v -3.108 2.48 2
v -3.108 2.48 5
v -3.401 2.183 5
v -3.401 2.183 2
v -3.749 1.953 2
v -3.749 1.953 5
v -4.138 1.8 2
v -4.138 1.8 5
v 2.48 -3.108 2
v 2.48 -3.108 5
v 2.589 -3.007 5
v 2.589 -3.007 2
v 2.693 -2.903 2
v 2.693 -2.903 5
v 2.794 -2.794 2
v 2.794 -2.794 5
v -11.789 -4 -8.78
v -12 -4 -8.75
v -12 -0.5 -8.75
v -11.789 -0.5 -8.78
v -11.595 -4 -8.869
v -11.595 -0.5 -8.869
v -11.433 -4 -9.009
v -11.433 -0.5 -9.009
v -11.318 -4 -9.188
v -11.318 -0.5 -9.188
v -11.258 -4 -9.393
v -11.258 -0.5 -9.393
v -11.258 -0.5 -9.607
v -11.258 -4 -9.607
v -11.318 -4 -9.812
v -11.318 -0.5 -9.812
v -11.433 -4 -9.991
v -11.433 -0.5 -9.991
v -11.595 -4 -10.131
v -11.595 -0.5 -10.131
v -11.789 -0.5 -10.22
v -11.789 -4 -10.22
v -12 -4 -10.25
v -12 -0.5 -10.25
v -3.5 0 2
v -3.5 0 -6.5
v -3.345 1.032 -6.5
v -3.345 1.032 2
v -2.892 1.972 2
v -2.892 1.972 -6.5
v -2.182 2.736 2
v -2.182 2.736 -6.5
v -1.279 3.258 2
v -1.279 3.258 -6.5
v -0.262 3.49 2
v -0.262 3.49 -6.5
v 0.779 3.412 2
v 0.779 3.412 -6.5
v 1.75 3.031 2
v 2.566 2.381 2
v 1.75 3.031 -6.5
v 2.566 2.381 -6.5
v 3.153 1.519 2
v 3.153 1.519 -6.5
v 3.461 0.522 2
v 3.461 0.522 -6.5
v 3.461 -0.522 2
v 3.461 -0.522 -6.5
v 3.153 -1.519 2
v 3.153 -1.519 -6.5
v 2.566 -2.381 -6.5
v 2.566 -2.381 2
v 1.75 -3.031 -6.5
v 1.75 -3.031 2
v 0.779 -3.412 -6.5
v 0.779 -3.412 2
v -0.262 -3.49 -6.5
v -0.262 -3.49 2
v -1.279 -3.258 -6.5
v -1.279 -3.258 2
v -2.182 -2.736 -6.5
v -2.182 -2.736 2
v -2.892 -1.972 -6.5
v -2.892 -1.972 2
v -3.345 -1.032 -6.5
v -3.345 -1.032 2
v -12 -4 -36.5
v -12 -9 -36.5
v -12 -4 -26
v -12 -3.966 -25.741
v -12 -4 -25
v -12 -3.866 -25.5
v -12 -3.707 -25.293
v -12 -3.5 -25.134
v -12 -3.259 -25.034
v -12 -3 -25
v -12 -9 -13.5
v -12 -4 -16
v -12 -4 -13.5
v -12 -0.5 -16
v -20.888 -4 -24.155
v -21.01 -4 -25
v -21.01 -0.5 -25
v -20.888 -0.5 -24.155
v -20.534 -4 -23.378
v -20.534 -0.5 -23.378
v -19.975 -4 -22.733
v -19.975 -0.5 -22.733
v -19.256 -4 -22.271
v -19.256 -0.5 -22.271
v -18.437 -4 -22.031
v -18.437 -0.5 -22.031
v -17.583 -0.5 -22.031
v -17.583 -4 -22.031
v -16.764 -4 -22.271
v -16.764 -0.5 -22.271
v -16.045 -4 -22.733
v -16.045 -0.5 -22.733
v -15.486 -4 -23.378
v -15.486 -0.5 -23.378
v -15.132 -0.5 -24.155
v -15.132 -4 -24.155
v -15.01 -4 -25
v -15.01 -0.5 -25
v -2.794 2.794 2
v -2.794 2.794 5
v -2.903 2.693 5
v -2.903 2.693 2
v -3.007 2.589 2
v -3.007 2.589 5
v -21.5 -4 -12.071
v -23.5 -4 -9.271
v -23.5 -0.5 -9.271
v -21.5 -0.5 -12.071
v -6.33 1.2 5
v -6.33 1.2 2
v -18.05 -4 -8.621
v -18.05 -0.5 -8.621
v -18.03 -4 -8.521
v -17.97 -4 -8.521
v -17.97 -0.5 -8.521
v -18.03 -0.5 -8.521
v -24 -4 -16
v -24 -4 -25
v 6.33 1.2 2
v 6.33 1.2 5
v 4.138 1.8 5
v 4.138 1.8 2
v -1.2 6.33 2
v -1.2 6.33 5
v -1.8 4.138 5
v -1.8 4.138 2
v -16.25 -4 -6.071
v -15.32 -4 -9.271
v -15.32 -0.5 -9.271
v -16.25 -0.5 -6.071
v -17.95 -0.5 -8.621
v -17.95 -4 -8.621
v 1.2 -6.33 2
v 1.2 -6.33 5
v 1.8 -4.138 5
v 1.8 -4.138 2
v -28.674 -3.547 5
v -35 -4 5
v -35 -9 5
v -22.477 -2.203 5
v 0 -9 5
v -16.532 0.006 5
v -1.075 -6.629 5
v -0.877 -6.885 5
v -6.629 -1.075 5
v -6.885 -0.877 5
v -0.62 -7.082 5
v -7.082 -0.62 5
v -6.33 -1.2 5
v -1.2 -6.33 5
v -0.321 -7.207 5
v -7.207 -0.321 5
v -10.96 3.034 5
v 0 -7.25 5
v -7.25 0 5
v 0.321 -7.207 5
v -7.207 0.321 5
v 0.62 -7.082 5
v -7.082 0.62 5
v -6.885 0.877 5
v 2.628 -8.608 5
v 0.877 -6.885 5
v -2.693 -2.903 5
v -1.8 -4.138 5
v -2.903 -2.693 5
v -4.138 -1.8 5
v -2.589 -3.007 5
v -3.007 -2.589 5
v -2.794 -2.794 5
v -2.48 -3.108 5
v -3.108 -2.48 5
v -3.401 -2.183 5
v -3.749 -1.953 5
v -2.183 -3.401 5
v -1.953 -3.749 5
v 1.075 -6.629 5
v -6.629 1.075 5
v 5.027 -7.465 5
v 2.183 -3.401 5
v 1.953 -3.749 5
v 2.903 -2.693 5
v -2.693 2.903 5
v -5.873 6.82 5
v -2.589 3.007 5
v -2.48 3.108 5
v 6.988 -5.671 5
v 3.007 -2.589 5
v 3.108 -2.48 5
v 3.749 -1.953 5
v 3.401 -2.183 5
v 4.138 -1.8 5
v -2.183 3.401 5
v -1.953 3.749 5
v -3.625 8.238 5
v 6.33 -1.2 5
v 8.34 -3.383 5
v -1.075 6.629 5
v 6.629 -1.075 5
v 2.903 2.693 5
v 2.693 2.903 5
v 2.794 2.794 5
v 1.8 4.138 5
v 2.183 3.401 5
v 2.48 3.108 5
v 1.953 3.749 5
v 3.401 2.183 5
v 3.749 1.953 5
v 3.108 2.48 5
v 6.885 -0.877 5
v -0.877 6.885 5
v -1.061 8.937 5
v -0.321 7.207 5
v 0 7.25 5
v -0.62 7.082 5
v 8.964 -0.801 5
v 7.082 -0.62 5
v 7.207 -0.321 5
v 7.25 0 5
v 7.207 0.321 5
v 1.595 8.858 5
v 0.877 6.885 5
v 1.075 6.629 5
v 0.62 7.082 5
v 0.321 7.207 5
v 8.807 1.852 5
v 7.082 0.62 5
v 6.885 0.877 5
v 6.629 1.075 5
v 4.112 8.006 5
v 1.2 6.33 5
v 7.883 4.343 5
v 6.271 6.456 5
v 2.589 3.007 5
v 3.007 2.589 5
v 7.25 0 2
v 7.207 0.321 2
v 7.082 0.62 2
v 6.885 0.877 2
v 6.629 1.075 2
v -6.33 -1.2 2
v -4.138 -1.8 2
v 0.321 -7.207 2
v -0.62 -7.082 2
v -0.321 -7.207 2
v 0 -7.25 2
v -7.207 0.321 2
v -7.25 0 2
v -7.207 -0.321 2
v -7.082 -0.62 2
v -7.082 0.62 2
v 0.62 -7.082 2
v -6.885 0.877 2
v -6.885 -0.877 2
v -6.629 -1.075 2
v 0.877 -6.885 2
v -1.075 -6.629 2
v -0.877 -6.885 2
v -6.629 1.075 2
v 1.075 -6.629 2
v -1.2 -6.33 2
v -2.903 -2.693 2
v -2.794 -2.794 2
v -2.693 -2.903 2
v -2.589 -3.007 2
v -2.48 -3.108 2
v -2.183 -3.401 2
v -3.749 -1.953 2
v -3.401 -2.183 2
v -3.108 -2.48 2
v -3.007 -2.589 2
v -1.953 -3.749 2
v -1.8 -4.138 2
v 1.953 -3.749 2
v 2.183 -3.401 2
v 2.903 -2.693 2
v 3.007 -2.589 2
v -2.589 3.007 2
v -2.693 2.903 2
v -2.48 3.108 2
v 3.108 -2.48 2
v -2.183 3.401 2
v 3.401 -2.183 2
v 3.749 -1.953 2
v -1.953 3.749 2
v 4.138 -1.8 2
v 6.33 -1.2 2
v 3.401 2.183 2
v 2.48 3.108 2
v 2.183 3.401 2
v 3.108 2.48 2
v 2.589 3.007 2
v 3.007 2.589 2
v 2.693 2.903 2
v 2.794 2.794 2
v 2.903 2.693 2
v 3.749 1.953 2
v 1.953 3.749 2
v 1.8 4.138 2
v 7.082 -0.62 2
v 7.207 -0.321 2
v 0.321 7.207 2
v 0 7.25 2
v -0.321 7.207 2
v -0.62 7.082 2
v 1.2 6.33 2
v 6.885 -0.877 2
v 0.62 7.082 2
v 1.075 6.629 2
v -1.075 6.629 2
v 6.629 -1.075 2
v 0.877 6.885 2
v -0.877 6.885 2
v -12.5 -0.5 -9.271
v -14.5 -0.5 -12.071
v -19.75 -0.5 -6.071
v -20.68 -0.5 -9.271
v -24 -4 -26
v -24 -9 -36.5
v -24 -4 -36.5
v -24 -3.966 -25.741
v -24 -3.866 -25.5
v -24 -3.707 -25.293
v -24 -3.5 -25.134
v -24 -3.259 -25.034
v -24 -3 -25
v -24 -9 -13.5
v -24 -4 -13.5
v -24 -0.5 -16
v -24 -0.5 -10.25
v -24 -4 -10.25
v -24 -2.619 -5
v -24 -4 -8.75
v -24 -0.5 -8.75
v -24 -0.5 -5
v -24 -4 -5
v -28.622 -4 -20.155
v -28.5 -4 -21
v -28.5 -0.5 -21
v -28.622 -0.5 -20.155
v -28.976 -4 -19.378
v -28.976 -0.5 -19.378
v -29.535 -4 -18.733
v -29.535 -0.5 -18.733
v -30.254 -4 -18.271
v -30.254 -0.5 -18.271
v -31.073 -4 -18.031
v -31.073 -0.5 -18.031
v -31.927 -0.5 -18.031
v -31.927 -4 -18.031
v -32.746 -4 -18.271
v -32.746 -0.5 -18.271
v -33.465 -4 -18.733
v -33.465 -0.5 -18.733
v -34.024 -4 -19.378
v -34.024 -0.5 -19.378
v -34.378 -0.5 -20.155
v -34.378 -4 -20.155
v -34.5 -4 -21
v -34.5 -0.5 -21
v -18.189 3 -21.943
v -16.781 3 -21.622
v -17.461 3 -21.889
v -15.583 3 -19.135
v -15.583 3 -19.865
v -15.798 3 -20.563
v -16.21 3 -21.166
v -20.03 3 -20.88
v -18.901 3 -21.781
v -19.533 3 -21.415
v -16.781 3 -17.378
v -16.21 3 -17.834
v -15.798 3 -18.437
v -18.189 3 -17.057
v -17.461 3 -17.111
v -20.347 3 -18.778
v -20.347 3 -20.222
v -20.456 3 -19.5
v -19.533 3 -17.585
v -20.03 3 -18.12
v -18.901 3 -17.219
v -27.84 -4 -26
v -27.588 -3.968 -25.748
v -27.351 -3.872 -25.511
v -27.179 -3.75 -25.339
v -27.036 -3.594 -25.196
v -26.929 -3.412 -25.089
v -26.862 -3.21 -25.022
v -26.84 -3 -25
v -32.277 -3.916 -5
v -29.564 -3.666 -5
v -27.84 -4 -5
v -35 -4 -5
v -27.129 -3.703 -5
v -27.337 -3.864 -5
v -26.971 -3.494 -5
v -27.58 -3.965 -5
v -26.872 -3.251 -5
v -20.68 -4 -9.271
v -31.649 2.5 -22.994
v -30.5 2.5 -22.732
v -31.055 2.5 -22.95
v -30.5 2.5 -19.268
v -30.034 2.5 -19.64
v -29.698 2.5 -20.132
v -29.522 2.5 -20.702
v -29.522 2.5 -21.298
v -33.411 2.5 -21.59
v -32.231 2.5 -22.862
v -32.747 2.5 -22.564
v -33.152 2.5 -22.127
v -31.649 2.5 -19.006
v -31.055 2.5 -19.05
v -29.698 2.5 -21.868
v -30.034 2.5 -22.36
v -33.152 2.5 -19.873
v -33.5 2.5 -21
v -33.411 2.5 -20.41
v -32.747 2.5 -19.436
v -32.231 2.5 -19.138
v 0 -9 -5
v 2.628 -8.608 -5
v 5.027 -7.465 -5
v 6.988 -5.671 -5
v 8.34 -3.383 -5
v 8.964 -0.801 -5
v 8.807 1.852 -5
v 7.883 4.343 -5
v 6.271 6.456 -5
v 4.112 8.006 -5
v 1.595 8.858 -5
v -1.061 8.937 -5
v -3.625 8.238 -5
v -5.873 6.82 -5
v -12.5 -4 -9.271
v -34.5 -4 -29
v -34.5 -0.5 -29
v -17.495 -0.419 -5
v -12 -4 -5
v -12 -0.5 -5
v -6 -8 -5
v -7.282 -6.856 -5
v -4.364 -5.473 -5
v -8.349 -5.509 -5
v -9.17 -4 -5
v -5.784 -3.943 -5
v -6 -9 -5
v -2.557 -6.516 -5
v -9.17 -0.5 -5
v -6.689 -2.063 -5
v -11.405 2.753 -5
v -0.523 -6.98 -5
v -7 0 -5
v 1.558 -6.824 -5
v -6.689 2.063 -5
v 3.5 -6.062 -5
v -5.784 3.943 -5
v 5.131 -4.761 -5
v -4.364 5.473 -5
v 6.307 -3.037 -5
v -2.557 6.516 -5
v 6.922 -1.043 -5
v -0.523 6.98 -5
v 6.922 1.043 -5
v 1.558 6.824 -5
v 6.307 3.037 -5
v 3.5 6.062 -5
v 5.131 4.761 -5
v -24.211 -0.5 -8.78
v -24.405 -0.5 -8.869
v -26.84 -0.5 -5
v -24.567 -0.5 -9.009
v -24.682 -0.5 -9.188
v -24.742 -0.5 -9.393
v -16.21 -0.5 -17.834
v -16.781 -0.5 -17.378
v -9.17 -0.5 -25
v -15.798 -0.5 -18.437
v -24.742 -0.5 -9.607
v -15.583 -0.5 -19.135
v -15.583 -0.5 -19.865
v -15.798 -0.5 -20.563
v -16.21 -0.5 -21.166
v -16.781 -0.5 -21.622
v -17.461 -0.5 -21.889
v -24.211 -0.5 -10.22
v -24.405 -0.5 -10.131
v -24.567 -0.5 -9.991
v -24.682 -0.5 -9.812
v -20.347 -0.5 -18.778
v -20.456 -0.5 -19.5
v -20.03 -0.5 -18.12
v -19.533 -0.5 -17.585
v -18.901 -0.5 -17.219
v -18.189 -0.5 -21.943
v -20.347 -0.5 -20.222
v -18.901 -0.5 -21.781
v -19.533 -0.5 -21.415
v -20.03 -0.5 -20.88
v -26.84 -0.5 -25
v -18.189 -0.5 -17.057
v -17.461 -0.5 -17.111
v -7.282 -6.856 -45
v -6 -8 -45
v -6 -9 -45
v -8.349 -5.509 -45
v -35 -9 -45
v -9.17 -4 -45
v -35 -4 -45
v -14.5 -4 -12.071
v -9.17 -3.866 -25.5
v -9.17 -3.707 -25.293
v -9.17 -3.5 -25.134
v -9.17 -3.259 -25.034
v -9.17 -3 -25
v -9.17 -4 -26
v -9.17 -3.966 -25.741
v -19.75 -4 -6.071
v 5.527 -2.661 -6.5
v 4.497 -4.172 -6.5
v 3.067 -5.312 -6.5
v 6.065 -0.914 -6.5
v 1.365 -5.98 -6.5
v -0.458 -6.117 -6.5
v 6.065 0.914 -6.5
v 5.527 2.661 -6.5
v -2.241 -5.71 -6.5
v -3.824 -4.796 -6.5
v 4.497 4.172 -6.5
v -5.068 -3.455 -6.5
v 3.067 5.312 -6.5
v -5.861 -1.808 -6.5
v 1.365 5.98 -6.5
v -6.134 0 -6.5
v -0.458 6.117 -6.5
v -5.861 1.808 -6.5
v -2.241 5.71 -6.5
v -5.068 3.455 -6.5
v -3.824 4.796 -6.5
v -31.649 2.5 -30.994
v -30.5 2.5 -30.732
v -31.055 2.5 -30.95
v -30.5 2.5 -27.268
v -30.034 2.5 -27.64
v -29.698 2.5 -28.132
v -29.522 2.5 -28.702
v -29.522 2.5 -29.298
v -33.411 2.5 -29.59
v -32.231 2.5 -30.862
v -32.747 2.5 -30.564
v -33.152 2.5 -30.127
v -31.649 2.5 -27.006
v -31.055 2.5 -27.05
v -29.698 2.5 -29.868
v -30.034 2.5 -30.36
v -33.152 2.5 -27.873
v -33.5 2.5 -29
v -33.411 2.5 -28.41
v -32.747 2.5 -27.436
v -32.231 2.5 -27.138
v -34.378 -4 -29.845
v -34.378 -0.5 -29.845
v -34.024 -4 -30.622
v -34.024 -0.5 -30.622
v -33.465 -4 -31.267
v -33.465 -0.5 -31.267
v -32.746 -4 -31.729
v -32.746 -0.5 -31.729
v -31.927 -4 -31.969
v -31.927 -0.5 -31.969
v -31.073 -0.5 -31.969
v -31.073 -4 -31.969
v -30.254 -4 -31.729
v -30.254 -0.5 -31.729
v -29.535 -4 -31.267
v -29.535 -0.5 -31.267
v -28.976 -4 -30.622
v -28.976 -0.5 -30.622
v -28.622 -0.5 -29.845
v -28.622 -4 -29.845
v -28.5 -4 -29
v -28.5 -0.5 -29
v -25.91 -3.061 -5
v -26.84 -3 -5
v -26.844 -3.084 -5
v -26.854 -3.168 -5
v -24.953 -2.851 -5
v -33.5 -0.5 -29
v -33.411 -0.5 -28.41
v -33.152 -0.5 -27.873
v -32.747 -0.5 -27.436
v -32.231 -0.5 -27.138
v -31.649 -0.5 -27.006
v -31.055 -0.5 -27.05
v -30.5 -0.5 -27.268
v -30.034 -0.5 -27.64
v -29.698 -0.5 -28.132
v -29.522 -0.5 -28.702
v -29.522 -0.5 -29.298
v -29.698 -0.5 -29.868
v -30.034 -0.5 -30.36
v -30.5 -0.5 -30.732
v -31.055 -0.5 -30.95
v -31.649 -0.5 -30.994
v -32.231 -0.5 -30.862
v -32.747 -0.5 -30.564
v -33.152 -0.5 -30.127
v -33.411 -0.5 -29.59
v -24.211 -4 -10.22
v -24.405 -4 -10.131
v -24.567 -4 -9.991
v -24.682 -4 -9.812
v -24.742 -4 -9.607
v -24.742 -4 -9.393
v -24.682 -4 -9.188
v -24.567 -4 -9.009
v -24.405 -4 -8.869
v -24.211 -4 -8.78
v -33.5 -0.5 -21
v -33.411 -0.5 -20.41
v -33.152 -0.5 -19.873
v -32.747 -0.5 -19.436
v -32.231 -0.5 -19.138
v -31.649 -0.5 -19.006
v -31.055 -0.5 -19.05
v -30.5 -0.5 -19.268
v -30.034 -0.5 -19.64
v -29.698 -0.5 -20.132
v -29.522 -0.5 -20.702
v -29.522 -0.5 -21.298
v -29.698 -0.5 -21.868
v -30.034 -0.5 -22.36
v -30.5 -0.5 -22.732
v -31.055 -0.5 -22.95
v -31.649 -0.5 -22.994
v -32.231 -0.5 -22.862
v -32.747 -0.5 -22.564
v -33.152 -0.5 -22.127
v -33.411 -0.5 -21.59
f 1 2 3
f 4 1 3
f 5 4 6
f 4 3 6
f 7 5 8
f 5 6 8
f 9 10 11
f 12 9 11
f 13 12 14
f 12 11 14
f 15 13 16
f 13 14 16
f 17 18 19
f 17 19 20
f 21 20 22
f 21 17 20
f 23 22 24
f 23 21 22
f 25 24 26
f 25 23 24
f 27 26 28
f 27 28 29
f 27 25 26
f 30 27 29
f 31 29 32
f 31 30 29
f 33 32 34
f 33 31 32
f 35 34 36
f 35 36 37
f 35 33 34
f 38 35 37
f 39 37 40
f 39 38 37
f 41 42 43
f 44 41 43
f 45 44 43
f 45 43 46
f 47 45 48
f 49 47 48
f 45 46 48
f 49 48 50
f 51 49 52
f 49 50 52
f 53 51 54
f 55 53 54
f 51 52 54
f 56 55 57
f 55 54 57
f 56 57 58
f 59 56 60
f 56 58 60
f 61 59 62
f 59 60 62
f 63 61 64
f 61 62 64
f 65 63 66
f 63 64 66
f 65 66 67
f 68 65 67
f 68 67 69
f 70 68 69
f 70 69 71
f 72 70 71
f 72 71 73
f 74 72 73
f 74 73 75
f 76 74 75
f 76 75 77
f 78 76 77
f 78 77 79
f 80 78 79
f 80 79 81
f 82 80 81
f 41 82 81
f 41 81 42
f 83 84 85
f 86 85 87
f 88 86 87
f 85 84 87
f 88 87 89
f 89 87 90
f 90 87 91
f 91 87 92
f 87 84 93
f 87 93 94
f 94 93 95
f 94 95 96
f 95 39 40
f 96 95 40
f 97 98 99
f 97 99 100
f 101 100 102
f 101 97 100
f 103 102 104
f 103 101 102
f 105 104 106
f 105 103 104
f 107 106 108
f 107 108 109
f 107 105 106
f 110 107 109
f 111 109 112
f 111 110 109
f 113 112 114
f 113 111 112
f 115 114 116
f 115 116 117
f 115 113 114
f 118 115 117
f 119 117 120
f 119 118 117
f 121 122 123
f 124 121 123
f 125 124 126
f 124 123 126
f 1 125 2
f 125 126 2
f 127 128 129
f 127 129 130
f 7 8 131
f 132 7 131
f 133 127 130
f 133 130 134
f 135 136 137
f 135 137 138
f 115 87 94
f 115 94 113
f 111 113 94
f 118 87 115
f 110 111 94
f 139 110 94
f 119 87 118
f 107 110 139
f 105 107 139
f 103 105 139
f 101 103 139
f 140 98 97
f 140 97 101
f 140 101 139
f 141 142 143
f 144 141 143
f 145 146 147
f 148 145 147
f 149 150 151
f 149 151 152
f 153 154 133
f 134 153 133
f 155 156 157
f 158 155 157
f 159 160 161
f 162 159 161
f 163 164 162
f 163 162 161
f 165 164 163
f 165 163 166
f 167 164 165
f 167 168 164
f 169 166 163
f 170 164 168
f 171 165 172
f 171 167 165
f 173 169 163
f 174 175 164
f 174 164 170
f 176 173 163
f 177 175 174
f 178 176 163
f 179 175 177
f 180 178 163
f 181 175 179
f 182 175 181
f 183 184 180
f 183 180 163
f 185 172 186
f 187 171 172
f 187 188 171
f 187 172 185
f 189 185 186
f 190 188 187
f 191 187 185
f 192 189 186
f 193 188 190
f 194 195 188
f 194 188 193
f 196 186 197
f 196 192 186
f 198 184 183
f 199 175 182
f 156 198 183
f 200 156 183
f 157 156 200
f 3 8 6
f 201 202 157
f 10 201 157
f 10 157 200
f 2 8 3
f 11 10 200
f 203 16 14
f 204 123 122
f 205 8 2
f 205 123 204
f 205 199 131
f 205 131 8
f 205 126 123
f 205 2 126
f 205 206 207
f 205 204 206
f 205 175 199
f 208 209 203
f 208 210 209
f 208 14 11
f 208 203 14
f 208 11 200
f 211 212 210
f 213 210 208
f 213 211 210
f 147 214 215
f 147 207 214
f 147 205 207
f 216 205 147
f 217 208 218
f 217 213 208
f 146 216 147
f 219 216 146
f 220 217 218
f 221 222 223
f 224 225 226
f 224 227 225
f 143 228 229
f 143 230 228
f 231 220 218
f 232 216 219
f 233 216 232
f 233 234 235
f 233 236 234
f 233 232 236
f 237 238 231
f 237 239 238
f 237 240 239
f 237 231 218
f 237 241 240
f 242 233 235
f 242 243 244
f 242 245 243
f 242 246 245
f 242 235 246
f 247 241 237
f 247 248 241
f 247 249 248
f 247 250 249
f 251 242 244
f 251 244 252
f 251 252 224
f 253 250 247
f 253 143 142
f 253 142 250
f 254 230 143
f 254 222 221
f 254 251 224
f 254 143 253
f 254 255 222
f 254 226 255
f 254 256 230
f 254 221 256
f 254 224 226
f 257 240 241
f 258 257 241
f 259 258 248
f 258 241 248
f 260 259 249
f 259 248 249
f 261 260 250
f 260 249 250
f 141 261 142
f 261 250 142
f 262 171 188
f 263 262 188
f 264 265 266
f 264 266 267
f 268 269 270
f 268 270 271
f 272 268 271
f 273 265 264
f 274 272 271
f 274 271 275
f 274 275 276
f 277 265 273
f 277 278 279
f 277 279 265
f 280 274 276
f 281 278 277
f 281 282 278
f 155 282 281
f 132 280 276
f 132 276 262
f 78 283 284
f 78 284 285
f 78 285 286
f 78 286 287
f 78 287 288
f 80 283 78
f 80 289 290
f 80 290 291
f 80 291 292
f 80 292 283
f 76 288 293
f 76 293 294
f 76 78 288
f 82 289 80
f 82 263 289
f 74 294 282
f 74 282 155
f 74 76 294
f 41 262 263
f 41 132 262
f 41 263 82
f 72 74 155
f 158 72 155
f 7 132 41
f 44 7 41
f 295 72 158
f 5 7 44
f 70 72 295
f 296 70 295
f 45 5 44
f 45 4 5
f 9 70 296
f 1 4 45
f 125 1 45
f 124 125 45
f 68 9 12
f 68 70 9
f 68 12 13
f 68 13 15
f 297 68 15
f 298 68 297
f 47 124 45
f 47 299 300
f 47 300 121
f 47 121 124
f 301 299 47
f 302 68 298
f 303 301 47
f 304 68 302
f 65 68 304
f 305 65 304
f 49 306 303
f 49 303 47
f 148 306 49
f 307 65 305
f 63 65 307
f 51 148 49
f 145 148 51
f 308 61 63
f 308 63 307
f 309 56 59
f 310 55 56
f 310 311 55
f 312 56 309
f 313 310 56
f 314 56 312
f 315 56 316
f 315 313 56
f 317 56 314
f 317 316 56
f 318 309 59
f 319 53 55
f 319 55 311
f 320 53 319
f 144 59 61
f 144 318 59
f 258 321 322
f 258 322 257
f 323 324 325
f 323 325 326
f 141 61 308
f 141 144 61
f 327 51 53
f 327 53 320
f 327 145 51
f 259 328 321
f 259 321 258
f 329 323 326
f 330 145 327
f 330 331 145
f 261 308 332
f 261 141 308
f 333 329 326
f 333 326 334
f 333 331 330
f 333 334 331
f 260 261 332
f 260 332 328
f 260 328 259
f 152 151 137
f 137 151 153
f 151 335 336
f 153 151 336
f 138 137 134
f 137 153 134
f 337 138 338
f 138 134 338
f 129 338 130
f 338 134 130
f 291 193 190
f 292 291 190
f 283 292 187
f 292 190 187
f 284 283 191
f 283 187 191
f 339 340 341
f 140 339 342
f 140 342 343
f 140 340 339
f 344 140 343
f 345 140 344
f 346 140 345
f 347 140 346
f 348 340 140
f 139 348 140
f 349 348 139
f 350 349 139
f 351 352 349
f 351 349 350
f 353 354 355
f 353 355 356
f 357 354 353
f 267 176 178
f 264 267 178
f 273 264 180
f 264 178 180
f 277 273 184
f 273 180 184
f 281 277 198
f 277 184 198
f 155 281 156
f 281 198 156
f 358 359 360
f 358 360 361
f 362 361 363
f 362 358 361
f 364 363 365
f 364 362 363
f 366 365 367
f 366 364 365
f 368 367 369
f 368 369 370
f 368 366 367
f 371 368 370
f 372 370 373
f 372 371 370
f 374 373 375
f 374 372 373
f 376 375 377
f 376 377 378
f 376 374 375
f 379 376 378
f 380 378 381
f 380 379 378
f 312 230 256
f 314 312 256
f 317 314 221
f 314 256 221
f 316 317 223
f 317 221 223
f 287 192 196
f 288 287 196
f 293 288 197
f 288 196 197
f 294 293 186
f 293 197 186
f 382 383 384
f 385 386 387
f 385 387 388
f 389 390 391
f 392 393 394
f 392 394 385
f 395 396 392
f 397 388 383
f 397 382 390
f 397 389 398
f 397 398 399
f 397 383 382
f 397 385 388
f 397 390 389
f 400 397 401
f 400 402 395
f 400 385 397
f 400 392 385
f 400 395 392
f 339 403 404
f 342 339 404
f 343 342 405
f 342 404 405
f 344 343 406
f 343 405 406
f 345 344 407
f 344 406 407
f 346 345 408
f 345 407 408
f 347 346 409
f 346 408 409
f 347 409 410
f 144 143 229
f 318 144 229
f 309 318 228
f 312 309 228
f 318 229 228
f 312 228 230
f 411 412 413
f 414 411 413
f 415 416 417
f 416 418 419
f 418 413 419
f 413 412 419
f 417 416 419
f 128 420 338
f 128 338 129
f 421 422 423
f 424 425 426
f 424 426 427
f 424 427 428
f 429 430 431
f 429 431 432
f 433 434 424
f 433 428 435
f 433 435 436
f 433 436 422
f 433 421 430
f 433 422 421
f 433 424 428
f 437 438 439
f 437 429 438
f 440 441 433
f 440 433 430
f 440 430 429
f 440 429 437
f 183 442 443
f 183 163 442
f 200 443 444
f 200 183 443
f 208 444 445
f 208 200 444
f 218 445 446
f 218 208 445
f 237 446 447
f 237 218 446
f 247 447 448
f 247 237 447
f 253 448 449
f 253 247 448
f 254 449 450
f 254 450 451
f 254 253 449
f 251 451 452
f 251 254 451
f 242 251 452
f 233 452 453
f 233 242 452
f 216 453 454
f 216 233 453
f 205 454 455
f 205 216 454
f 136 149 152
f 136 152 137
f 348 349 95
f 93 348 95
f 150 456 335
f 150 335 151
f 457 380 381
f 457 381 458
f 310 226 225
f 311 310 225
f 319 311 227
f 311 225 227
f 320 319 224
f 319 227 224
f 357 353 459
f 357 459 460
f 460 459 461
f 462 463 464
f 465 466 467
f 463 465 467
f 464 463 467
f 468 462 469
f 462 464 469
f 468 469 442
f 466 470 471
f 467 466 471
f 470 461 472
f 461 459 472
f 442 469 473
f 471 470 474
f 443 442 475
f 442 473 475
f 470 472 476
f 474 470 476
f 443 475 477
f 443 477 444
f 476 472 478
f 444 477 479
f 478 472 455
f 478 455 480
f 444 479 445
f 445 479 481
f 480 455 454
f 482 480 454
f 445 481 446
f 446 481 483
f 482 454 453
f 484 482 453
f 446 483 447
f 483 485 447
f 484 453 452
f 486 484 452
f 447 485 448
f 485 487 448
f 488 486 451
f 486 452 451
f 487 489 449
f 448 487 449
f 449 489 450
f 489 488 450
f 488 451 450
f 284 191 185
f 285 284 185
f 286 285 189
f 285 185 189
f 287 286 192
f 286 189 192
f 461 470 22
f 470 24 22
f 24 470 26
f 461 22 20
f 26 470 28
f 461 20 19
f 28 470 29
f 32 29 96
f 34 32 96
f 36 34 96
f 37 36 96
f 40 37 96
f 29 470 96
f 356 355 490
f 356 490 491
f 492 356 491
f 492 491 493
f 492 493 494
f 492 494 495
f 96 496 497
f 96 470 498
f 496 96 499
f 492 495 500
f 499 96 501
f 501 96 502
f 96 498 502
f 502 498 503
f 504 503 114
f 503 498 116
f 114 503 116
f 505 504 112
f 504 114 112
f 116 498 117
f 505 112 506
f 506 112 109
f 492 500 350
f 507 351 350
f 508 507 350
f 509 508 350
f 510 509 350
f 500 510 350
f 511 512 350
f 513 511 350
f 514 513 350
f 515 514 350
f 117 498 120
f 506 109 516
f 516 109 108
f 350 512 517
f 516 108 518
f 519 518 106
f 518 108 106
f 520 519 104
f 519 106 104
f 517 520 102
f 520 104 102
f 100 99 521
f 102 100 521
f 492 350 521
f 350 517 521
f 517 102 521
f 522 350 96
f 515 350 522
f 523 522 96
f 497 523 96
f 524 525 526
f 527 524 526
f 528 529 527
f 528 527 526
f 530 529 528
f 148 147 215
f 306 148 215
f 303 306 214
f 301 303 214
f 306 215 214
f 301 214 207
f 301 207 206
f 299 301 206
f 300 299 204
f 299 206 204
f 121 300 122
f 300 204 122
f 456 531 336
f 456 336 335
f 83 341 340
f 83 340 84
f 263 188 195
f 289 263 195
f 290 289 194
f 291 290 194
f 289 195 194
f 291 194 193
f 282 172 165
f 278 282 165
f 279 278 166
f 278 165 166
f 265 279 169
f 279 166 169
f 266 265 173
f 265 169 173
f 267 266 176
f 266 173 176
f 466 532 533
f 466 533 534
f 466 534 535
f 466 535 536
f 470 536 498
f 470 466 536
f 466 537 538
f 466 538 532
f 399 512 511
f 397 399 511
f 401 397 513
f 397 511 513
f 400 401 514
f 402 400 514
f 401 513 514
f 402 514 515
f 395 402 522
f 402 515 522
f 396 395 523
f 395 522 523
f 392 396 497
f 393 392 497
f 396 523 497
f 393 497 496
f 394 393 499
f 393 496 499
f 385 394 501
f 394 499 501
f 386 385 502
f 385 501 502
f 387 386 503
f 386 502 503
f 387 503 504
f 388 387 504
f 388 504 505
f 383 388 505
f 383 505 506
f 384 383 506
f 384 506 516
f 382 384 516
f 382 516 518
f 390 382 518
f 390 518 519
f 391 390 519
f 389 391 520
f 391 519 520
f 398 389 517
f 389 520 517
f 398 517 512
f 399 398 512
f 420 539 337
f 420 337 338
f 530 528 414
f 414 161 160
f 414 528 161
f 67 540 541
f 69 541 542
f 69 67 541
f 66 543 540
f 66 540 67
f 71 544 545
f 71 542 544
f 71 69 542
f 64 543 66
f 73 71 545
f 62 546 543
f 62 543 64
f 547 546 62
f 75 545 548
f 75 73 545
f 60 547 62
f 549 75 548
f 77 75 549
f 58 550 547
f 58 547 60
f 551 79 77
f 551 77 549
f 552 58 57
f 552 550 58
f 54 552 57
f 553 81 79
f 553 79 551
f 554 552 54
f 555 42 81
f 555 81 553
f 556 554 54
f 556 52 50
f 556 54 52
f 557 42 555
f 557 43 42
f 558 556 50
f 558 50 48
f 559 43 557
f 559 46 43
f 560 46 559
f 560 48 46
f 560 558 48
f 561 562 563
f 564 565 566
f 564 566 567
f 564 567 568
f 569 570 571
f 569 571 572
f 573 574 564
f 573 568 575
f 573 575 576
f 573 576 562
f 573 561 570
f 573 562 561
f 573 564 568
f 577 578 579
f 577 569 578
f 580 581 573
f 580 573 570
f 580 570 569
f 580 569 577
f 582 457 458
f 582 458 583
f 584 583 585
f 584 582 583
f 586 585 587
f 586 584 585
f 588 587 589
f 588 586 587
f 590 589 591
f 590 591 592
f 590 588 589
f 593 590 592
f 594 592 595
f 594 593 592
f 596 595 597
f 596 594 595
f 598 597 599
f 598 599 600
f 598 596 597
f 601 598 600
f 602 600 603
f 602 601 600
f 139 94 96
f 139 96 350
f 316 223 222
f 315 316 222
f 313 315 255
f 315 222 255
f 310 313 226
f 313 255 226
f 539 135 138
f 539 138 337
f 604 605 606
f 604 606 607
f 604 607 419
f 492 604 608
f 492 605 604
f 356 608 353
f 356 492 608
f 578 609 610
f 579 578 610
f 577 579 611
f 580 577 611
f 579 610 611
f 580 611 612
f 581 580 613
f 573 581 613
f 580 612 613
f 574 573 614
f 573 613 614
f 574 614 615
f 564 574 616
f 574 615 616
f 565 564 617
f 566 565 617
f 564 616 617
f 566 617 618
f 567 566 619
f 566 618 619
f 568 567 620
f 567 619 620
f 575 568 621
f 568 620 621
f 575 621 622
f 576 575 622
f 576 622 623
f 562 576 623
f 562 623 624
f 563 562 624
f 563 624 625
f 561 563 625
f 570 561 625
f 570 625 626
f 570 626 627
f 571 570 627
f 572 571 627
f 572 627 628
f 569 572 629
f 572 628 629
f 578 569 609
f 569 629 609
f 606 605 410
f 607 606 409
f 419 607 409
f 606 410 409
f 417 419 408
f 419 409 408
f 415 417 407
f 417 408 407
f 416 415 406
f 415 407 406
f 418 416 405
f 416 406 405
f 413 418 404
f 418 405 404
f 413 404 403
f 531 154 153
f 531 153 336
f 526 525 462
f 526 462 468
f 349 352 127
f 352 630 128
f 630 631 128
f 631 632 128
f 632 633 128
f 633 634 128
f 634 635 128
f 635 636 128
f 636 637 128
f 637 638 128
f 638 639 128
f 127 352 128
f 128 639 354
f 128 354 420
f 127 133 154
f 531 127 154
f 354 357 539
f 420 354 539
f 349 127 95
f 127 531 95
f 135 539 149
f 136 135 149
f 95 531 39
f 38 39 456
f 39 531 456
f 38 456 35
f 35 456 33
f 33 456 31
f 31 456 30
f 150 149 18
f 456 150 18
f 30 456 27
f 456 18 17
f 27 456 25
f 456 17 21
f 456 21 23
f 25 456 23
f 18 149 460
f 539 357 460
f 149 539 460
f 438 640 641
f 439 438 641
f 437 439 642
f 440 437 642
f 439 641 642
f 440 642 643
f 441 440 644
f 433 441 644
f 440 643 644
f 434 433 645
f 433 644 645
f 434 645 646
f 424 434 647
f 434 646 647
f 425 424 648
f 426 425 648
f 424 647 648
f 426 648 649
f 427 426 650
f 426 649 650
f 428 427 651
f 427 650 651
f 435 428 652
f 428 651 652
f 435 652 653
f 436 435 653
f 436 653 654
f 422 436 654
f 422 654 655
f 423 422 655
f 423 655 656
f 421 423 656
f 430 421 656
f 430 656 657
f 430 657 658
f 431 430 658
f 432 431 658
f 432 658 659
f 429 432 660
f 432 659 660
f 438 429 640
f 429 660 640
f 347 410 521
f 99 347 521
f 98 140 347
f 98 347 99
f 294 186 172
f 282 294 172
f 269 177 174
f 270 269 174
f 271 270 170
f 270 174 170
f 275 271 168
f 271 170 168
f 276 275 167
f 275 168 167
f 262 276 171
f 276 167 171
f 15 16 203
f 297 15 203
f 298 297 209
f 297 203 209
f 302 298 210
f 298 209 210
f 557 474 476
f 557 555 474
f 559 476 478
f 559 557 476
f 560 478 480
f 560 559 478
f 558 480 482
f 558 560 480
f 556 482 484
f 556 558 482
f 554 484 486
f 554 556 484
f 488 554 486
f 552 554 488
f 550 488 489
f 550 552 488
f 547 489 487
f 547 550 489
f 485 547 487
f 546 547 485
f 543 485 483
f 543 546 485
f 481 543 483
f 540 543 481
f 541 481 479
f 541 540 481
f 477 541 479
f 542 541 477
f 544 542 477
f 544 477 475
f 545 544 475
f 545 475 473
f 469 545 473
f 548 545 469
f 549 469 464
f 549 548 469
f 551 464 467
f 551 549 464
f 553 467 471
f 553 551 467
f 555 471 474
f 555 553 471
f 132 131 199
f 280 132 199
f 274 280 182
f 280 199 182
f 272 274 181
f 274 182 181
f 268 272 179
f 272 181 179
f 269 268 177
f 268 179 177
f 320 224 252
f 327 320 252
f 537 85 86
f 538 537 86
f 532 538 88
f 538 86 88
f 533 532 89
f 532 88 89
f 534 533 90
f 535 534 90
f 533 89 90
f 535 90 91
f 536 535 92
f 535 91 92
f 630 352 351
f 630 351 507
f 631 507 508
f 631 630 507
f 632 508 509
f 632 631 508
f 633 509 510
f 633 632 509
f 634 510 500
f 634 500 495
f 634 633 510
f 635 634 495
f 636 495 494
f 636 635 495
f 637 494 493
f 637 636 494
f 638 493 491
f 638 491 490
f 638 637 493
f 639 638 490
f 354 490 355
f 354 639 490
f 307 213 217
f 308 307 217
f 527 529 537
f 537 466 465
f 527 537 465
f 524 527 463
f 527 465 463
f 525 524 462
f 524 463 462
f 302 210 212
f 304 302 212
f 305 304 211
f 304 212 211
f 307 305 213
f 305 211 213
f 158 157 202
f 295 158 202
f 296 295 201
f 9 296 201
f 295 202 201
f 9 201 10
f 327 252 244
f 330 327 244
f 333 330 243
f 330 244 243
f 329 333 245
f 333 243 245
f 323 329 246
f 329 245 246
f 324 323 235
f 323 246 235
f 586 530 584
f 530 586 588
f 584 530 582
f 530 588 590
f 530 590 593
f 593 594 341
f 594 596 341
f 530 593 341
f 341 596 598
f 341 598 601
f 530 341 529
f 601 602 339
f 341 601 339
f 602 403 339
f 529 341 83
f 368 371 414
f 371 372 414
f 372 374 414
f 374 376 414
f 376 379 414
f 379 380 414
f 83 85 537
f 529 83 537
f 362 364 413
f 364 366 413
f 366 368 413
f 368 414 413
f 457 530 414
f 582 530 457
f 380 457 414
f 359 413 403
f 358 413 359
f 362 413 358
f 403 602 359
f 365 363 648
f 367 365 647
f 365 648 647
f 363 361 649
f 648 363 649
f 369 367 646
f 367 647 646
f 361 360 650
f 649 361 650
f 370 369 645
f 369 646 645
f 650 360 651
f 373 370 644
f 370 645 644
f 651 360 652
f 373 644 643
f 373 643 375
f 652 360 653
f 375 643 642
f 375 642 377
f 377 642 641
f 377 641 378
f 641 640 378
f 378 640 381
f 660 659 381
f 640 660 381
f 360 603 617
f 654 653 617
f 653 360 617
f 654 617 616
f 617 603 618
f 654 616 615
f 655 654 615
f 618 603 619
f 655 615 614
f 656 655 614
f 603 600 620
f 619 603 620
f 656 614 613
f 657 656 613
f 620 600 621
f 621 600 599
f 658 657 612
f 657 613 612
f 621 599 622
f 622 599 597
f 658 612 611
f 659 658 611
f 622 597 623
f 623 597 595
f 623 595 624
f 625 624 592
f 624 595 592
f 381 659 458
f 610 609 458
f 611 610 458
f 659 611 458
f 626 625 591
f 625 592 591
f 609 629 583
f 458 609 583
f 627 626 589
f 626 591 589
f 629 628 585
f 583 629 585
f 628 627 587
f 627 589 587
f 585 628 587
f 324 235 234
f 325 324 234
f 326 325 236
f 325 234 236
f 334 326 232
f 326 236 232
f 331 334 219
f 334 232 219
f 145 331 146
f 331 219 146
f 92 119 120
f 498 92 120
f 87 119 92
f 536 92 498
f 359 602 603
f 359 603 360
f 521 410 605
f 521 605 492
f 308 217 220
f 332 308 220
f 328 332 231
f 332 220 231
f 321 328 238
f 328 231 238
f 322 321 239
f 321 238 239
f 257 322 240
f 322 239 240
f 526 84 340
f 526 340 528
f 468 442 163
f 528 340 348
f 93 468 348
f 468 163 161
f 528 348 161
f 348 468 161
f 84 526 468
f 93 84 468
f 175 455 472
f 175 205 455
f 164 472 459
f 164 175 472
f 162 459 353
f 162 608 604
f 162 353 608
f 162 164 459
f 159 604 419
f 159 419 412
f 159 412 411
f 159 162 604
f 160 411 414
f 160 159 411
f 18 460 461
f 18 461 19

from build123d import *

# Parameters (mm, degrees)
SKETCH1_R                     = 9
BOSS_EXTRUDE1_DEPTH           = 5
SKETCH2_R                     = 7
BOSS_EXTRUDE2_DEPTH           = 1.5
BOSS_EXTRUDE2_TAPER           = 30
BOSS_EXTRUDE2_OTHER_WAY_DEPTH = 1.5
BOSS_EXTRUDE2_OTHER_WAY_TAPER = 30
CUT_EXTRUDE1_DEPTH            = 3
BOSS_EXTRUDE3_DEPTH           = 40
SKETCH5_W                     = 12
SKETCH5_H                     = 23
CUT_EXTRUDE2_DEPTH            = 40
BOSS_EXTRUDE4_DEPTH           = 3.5
SKETCH7_R                     = 2
BOSS_EXTRUDE5_DEPTH           = 3
SKETCH8_R                     = 3.5
CUT_EXTRUDE3_DEPTH            = 53.803882433
BOSS_EXTRUDE6_DEPTH           = 3.5
SKETCH10_R                    = 2.45
BOSS_EXTRUDE7_DEPTH           = 3.5
BOSS_EXTRUDE8_DEPTH           = 3.5
FILLET1_START                 = -26.84
FILLET1_DEPTH                 = 2.84
FILLET1_START_2               = -12
FILLET1_2_DEPTH               = 2.83
FILLET1_START_3               = -26
FILLET1_3_DEPTH               = 21
FILLET1_START_4               = -27.84
FILLET1_4_DEPTH               = 1


with BuildPart() as part:
    # Sketch1 → Boss-Extrude1 (new, symmetric)
    with BuildSketch(Plane.XY):
        Circle(SKETCH1_R)
        with BuildLine():
            Line((-35, -9), (0, -9))
            ThreePointArc((0, -9), (-8.437416666, -3.132091953), (-5.872614409, 6.82))
            ThreePointArc((-5.872614409, 6.82), (-19.465199243, -1.204217751), (-35, -4))
            Line((-35, -4), (-35, -9))
        make_face()
    extrude(amount=BOSS_EXTRUDE1_DEPTH, both=True)

    # Sketch2 → Boss-Extrude2 (add)
    with BuildSketch(Plane(origin=(0, 0, -5), x_dir=(-1, 0, 0), z_dir=(0, 0, -1))):
        Circle(SKETCH2_R)
    extrude(amount=BOSS_EXTRUDE2_DEPTH, taper=BOSS_EXTRUDE2_TAPER)

    # Sketch2 → Boss-Extrude2 other way (add)
    with BuildSketch(Plane(origin=(0, 0, -5), x_dir=(-1, 0, 0), z_dir=(0, 0, -1))):
        Circle(SKETCH2_R)
    extrude(amount=-BOSS_EXTRUDE2_OTHER_WAY_DEPTH, taper=BOSS_EXTRUDE2_OTHER_WAY_TAPER)

    # Sketch3 → Cut-Extrude1 (cut)
    with BuildSketch(Plane.XY.offset(5)):
        with BuildLine():
            Line((1.2, -6.33), (1.8, -4.1378116))
            ThreePointArc((1.8, -4.1378116), (2.058560194, -3.569045514), (2.48, -3.1078116))
            ThreePointArc((2.48, -3.1078116), (2.641475661, -2.955390865), (2.794244497, -2.794244497))
            ThreePointArc((2.794244497, -2.794244497), (2.955390865, -2.641475661), (3.1078116, -2.48))
            ThreePointArc((3.1078116, -2.48), (3.569045514, -2.058560194), (4.1378116, -1.8))
            Line((4.1378116, -1.8), (6.33, -1.2))
            ThreePointArc((6.33, -1.2), (6.992020752, -0.754882576), (7.25, 0))
            ThreePointArc((7.25, 0), (6.992020752, 0.754882576), (6.33, 1.2))
            Line((6.33, 1.2), (4.1378116, 1.8))
            ThreePointArc((4.1378116, 1.8), (3.569045514, 2.058560194), (3.1078116, 2.48))
            ThreePointArc((3.1078116, 2.48), (2.955390865, 2.641475661), (2.794244497, 2.794244497))
            ThreePointArc((2.794244497, 2.794244497), (2.641475661, 2.955390865), (2.48, 3.1078116))
            ThreePointArc((2.48, 3.1078116), (2.058560194, 3.569045514), (1.8, 4.1378116))
            Line((1.8, 4.1378116), (1.2, 6.33))
            ThreePointArc((1.2, 6.33), (0.754882576, 6.992020752), (0, 7.25))
            ThreePointArc((0, 7.25), (-0.754882576, 6.992020752), (-1.2, 6.33))
            Line((-1.2, 6.33), (-1.8, 4.1378116))
            ThreePointArc((-1.8, 4.1378116), (-2.058560194, 3.569045514), (-2.48, 3.1078116))
            ThreePointArc((-2.48, 3.1078116), (-2.641475661, 2.955390865), (-2.794244497, 2.794244497))
            ThreePointArc((-2.794244497, 2.794244497), (-2.955390865, 2.641475661), (-3.1078116, 2.48))
            ThreePointArc((-3.1078116, 2.48), (-3.569045514, 2.058560194), (-4.1378116, 1.8))
            Line((-4.1378116, 1.8), (-6.33, 1.2))
            ThreePointArc((-6.33, 1.2), (-6.992020752, 0.754882576), (-7.25, 0))
            ThreePointArc((-7.25, 0), (-6.992020752, -0.754882576), (-6.33, -1.2))
            Line((-6.33, -1.2), (-4.1378116, -1.8))
            ThreePointArc((-4.1378116, -1.8), (-3.569045514, -2.058560194), (-3.1078116, -2.48))
            ThreePointArc((-3.1078116, -2.48), (-2.955390865, -2.641475661), (-2.794244497, -2.794244497))
            ThreePointArc((-2.794244497, -2.794244497), (-2.641475661, -2.955390865), (-2.48, -3.1078116))
            ThreePointArc((-2.48, -3.1078116), (-2.058560194, -3.569045514), (-1.8, -4.1378116))
            Line((-1.8, -4.1378116), (-1.2, -6.33))
            ThreePointArc((-1.2, -6.33), (-0.754882576, -6.992020752), (0, -7.25))
            ThreePointArc((0, -7.25), (0.754882576, -6.992020752), (1.2, -6.33))
        make_face()
    extrude(amount=-CUT_EXTRUDE1_DEPTH, mode=Mode.SUBTRACT)

    # Sketch4 → Boss-Extrude3 (add)
    with BuildSketch(Plane(origin=(0, 0, -5), x_dir=(-1, 0, 0), z_dir=(0, 0, -1))):
        with BuildLine():
            Line((35, -9), (35, -4))
            Line((35, -4), (9.17, -4))
            ThreePointArc((9.17, -4), (7.844486312, -6.205642902), (6, -8))
            Line((6, -8), (6, -9))
            Line((6, -9), (35, -9))
        make_face()
    extrude(amount=BOSS_EXTRUDE3_DEPTH)

    # Sketch5 → Cut-Extrude2 (cut)
    with BuildSketch(Plane(origin=(0, -4, 0), x_dir=(1, 0, 0), z_dir=(0, 1, 0))):
        with Locations((-18, 25)):
            Rectangle(SKETCH5_W, SKETCH5_H)
    extrude(amount=-CUT_EXTRUDE2_DEPTH, mode=Mode.SUBTRACT)

    # Sketch6 → Boss-Extrude4 (add)
    with BuildSketch(Plane(origin=(0, -4, 0), x_dir=(1, 0, 0), z_dir=(0, 1, 0))):
        with BuildLine():
            Line((-28.5, 29), (-28.5, 21))
            ThreePointArc((-28.5, 21), (-31.5, 18), (-34.5, 21))
            Line((-34.5, 21), (-34.5, 29))
            ThreePointArc((-34.5, 29), (-31.5, 32), (-28.5, 29))
        make_face()
    extrude(amount=BOSS_EXTRUDE4_DEPTH)

    # Sketch7 → Boss-Extrude5 (add)
    with BuildSketch(Plane(origin=(0, -0.5, 0), x_dir=(1, 0, 0), z_dir=(0, 1, 0))):
        with Locations(Location((-31.5, 29, 0), (0, 0, 180))):
            Circle(SKETCH7_R)
        with Locations(Location((-31.5, 21, 0), (0, 0, 180))):
            Circle(SKETCH7_R)
    extrude(amount=BOSS_EXTRUDE5_DEPTH)

    # Sketch8 → Cut-Extrude3 (cut, through all)
    with BuildSketch(Plane(origin=(0, 0, -6.5), x_dir=(-1, 0, 0), z_dir=(0, 0, -1))):
        Circle(SKETCH8_R)
    extrude(amount=-CUT_EXTRUDE3_DEPTH, mode=Mode.SUBTRACT)

    # Sketch9 → Boss-Extrude6 (add)
    with BuildSketch(Plane(origin=(0, -4, 0), x_dir=(1, 0, 0), z_dir=(0, 1, 0))):
        with BuildLine():
            Line((-26.84, 5), (-26.84, 25))
            Line((-26.84, 25), (-21.01, 25))
            ThreePointArc((-21.01, 25), (-18.01, 22), (-15.01, 25))
            Line((-15.01, 25), (-9.17, 25))
            Line((-9.17, 25), (-9.17, 5))
            Line((-9.17, 5), (-12, 5))
            Line((-12, 5), (-12, 8.75))
            ThreePointArc((-12, 8.75), (-11.25, 9.5), (-12, 10.25))
            Line((-12, 10.25), (-12, 16))
            Line((-12, 16), (-17.99, 16))
            Line((-17.99, 16), (-18.01, 16))
            Line((-18.01, 16), (-24, 16))
            Line((-24, 16), (-24, 10.25))
            ThreePointArc((-24, 10.25), (-24.75, 9.5), (-24, 8.75))
            Line((-24, 8.75), (-24, 5))
            Line((-24, 5), (-26.84, 5))
        make_face()
    extrude(amount=BOSS_EXTRUDE6_DEPTH)

    # Sketch10 → Boss-Extrude7 (add)
    with BuildSketch(Plane(origin=(0, -0.5, 0), x_dir=(1, 0, 0), z_dir=(0, 1, 0))):
        with Locations(Location((-18.005833333, 19.5, 0), (0, 0, 180))):
            Circle(SKETCH10_R)
    extrude(amount=BOSS_EXTRUDE7_DEPTH)

    # Sketch11 → Boss-Extrude8 (add)
    with BuildSketch(Plane(origin=(0, -4, 0), x_dir=(1, 0, 0), z_dir=(0, 1, 0))):
        Polygon((-20.68, 9.27091935), (-23.5, 9.27091935), (-21.5, 12.07091935), (-18.05, 8.62091935), (-18, 8.62091935), (-17.95, 8.62091935), (-14.5, 12.07091935), (-12.5, 9.27091935), (-15.32, 9.27091935), (-16.25, 6.07091935), (-17.97, 8.52091935), (-18.03, 8.52091935), (-19.75, 6.07091935), align=None)
    extrude(amount=BOSS_EXTRUDE8_DEPTH)

    # Fillet1: read off the stored shape, not the designer's step
    # Fillet1 outline → Fillet1 (add)
    with BuildSketch(Plane.YZ.offset(FILLET1_START)):
        with BuildLine():
            ThreePointArc((-4, -26), (-3.707106781, -25.292893219), (-3, -25))
            Line((-3, -25), (-4, -25))
            Line((-4, -25), (-4, -26))
        make_face()
    extrude(amount=FILLET1_DEPTH)

    # Fillet1 2 outline → Fillet1 2 (add)
    with BuildSketch(Plane.YZ.offset(FILLET1_START_2)):
        with BuildLine():
            ThreePointArc((-4, -26), (-3.707106781, -25.292893219), (-3, -25))
            Line((-3, -25), (-4, -25))
            Line((-4, -25), (-4, -26))
        make_face()
    extrude(amount=FILLET1_2_DEPTH)

    # Fillet1 3 outline → Fillet1 3 (add)
    with BuildSketch(Plane.XY.offset(FILLET1_START_3)):
        with BuildLine():
            Line((-26.84, -4), (-26.84, -3))
            ThreePointArc((-26.84, -3), (-27.132893219, -3.707106781), (-27.84, -4))
            Line((-27.84, -4), (-26.84, -4))
        make_face()
    extrude(amount=FILLET1_3_DEPTH)

    # Fillet1 4 outline → Fillet1 4 (cut)
    with BuildSketch(Plane.YZ.offset(FILLET1_START_4)):
        with BuildLine():
            Line((-2, -24.999999999), (-3, -25))
            ThreePointArc((-3, -25), (-3.707106781, -25.292893219), (-4, -26))
            Line((-4, -26), (-2, -26))
            Line((-2, -26), (-2, -24.999999999))
        make_face()
    extrude(amount=FILLET1_4_DEPTH, mode=Mode.SUBTRACT)


solid = part.part
